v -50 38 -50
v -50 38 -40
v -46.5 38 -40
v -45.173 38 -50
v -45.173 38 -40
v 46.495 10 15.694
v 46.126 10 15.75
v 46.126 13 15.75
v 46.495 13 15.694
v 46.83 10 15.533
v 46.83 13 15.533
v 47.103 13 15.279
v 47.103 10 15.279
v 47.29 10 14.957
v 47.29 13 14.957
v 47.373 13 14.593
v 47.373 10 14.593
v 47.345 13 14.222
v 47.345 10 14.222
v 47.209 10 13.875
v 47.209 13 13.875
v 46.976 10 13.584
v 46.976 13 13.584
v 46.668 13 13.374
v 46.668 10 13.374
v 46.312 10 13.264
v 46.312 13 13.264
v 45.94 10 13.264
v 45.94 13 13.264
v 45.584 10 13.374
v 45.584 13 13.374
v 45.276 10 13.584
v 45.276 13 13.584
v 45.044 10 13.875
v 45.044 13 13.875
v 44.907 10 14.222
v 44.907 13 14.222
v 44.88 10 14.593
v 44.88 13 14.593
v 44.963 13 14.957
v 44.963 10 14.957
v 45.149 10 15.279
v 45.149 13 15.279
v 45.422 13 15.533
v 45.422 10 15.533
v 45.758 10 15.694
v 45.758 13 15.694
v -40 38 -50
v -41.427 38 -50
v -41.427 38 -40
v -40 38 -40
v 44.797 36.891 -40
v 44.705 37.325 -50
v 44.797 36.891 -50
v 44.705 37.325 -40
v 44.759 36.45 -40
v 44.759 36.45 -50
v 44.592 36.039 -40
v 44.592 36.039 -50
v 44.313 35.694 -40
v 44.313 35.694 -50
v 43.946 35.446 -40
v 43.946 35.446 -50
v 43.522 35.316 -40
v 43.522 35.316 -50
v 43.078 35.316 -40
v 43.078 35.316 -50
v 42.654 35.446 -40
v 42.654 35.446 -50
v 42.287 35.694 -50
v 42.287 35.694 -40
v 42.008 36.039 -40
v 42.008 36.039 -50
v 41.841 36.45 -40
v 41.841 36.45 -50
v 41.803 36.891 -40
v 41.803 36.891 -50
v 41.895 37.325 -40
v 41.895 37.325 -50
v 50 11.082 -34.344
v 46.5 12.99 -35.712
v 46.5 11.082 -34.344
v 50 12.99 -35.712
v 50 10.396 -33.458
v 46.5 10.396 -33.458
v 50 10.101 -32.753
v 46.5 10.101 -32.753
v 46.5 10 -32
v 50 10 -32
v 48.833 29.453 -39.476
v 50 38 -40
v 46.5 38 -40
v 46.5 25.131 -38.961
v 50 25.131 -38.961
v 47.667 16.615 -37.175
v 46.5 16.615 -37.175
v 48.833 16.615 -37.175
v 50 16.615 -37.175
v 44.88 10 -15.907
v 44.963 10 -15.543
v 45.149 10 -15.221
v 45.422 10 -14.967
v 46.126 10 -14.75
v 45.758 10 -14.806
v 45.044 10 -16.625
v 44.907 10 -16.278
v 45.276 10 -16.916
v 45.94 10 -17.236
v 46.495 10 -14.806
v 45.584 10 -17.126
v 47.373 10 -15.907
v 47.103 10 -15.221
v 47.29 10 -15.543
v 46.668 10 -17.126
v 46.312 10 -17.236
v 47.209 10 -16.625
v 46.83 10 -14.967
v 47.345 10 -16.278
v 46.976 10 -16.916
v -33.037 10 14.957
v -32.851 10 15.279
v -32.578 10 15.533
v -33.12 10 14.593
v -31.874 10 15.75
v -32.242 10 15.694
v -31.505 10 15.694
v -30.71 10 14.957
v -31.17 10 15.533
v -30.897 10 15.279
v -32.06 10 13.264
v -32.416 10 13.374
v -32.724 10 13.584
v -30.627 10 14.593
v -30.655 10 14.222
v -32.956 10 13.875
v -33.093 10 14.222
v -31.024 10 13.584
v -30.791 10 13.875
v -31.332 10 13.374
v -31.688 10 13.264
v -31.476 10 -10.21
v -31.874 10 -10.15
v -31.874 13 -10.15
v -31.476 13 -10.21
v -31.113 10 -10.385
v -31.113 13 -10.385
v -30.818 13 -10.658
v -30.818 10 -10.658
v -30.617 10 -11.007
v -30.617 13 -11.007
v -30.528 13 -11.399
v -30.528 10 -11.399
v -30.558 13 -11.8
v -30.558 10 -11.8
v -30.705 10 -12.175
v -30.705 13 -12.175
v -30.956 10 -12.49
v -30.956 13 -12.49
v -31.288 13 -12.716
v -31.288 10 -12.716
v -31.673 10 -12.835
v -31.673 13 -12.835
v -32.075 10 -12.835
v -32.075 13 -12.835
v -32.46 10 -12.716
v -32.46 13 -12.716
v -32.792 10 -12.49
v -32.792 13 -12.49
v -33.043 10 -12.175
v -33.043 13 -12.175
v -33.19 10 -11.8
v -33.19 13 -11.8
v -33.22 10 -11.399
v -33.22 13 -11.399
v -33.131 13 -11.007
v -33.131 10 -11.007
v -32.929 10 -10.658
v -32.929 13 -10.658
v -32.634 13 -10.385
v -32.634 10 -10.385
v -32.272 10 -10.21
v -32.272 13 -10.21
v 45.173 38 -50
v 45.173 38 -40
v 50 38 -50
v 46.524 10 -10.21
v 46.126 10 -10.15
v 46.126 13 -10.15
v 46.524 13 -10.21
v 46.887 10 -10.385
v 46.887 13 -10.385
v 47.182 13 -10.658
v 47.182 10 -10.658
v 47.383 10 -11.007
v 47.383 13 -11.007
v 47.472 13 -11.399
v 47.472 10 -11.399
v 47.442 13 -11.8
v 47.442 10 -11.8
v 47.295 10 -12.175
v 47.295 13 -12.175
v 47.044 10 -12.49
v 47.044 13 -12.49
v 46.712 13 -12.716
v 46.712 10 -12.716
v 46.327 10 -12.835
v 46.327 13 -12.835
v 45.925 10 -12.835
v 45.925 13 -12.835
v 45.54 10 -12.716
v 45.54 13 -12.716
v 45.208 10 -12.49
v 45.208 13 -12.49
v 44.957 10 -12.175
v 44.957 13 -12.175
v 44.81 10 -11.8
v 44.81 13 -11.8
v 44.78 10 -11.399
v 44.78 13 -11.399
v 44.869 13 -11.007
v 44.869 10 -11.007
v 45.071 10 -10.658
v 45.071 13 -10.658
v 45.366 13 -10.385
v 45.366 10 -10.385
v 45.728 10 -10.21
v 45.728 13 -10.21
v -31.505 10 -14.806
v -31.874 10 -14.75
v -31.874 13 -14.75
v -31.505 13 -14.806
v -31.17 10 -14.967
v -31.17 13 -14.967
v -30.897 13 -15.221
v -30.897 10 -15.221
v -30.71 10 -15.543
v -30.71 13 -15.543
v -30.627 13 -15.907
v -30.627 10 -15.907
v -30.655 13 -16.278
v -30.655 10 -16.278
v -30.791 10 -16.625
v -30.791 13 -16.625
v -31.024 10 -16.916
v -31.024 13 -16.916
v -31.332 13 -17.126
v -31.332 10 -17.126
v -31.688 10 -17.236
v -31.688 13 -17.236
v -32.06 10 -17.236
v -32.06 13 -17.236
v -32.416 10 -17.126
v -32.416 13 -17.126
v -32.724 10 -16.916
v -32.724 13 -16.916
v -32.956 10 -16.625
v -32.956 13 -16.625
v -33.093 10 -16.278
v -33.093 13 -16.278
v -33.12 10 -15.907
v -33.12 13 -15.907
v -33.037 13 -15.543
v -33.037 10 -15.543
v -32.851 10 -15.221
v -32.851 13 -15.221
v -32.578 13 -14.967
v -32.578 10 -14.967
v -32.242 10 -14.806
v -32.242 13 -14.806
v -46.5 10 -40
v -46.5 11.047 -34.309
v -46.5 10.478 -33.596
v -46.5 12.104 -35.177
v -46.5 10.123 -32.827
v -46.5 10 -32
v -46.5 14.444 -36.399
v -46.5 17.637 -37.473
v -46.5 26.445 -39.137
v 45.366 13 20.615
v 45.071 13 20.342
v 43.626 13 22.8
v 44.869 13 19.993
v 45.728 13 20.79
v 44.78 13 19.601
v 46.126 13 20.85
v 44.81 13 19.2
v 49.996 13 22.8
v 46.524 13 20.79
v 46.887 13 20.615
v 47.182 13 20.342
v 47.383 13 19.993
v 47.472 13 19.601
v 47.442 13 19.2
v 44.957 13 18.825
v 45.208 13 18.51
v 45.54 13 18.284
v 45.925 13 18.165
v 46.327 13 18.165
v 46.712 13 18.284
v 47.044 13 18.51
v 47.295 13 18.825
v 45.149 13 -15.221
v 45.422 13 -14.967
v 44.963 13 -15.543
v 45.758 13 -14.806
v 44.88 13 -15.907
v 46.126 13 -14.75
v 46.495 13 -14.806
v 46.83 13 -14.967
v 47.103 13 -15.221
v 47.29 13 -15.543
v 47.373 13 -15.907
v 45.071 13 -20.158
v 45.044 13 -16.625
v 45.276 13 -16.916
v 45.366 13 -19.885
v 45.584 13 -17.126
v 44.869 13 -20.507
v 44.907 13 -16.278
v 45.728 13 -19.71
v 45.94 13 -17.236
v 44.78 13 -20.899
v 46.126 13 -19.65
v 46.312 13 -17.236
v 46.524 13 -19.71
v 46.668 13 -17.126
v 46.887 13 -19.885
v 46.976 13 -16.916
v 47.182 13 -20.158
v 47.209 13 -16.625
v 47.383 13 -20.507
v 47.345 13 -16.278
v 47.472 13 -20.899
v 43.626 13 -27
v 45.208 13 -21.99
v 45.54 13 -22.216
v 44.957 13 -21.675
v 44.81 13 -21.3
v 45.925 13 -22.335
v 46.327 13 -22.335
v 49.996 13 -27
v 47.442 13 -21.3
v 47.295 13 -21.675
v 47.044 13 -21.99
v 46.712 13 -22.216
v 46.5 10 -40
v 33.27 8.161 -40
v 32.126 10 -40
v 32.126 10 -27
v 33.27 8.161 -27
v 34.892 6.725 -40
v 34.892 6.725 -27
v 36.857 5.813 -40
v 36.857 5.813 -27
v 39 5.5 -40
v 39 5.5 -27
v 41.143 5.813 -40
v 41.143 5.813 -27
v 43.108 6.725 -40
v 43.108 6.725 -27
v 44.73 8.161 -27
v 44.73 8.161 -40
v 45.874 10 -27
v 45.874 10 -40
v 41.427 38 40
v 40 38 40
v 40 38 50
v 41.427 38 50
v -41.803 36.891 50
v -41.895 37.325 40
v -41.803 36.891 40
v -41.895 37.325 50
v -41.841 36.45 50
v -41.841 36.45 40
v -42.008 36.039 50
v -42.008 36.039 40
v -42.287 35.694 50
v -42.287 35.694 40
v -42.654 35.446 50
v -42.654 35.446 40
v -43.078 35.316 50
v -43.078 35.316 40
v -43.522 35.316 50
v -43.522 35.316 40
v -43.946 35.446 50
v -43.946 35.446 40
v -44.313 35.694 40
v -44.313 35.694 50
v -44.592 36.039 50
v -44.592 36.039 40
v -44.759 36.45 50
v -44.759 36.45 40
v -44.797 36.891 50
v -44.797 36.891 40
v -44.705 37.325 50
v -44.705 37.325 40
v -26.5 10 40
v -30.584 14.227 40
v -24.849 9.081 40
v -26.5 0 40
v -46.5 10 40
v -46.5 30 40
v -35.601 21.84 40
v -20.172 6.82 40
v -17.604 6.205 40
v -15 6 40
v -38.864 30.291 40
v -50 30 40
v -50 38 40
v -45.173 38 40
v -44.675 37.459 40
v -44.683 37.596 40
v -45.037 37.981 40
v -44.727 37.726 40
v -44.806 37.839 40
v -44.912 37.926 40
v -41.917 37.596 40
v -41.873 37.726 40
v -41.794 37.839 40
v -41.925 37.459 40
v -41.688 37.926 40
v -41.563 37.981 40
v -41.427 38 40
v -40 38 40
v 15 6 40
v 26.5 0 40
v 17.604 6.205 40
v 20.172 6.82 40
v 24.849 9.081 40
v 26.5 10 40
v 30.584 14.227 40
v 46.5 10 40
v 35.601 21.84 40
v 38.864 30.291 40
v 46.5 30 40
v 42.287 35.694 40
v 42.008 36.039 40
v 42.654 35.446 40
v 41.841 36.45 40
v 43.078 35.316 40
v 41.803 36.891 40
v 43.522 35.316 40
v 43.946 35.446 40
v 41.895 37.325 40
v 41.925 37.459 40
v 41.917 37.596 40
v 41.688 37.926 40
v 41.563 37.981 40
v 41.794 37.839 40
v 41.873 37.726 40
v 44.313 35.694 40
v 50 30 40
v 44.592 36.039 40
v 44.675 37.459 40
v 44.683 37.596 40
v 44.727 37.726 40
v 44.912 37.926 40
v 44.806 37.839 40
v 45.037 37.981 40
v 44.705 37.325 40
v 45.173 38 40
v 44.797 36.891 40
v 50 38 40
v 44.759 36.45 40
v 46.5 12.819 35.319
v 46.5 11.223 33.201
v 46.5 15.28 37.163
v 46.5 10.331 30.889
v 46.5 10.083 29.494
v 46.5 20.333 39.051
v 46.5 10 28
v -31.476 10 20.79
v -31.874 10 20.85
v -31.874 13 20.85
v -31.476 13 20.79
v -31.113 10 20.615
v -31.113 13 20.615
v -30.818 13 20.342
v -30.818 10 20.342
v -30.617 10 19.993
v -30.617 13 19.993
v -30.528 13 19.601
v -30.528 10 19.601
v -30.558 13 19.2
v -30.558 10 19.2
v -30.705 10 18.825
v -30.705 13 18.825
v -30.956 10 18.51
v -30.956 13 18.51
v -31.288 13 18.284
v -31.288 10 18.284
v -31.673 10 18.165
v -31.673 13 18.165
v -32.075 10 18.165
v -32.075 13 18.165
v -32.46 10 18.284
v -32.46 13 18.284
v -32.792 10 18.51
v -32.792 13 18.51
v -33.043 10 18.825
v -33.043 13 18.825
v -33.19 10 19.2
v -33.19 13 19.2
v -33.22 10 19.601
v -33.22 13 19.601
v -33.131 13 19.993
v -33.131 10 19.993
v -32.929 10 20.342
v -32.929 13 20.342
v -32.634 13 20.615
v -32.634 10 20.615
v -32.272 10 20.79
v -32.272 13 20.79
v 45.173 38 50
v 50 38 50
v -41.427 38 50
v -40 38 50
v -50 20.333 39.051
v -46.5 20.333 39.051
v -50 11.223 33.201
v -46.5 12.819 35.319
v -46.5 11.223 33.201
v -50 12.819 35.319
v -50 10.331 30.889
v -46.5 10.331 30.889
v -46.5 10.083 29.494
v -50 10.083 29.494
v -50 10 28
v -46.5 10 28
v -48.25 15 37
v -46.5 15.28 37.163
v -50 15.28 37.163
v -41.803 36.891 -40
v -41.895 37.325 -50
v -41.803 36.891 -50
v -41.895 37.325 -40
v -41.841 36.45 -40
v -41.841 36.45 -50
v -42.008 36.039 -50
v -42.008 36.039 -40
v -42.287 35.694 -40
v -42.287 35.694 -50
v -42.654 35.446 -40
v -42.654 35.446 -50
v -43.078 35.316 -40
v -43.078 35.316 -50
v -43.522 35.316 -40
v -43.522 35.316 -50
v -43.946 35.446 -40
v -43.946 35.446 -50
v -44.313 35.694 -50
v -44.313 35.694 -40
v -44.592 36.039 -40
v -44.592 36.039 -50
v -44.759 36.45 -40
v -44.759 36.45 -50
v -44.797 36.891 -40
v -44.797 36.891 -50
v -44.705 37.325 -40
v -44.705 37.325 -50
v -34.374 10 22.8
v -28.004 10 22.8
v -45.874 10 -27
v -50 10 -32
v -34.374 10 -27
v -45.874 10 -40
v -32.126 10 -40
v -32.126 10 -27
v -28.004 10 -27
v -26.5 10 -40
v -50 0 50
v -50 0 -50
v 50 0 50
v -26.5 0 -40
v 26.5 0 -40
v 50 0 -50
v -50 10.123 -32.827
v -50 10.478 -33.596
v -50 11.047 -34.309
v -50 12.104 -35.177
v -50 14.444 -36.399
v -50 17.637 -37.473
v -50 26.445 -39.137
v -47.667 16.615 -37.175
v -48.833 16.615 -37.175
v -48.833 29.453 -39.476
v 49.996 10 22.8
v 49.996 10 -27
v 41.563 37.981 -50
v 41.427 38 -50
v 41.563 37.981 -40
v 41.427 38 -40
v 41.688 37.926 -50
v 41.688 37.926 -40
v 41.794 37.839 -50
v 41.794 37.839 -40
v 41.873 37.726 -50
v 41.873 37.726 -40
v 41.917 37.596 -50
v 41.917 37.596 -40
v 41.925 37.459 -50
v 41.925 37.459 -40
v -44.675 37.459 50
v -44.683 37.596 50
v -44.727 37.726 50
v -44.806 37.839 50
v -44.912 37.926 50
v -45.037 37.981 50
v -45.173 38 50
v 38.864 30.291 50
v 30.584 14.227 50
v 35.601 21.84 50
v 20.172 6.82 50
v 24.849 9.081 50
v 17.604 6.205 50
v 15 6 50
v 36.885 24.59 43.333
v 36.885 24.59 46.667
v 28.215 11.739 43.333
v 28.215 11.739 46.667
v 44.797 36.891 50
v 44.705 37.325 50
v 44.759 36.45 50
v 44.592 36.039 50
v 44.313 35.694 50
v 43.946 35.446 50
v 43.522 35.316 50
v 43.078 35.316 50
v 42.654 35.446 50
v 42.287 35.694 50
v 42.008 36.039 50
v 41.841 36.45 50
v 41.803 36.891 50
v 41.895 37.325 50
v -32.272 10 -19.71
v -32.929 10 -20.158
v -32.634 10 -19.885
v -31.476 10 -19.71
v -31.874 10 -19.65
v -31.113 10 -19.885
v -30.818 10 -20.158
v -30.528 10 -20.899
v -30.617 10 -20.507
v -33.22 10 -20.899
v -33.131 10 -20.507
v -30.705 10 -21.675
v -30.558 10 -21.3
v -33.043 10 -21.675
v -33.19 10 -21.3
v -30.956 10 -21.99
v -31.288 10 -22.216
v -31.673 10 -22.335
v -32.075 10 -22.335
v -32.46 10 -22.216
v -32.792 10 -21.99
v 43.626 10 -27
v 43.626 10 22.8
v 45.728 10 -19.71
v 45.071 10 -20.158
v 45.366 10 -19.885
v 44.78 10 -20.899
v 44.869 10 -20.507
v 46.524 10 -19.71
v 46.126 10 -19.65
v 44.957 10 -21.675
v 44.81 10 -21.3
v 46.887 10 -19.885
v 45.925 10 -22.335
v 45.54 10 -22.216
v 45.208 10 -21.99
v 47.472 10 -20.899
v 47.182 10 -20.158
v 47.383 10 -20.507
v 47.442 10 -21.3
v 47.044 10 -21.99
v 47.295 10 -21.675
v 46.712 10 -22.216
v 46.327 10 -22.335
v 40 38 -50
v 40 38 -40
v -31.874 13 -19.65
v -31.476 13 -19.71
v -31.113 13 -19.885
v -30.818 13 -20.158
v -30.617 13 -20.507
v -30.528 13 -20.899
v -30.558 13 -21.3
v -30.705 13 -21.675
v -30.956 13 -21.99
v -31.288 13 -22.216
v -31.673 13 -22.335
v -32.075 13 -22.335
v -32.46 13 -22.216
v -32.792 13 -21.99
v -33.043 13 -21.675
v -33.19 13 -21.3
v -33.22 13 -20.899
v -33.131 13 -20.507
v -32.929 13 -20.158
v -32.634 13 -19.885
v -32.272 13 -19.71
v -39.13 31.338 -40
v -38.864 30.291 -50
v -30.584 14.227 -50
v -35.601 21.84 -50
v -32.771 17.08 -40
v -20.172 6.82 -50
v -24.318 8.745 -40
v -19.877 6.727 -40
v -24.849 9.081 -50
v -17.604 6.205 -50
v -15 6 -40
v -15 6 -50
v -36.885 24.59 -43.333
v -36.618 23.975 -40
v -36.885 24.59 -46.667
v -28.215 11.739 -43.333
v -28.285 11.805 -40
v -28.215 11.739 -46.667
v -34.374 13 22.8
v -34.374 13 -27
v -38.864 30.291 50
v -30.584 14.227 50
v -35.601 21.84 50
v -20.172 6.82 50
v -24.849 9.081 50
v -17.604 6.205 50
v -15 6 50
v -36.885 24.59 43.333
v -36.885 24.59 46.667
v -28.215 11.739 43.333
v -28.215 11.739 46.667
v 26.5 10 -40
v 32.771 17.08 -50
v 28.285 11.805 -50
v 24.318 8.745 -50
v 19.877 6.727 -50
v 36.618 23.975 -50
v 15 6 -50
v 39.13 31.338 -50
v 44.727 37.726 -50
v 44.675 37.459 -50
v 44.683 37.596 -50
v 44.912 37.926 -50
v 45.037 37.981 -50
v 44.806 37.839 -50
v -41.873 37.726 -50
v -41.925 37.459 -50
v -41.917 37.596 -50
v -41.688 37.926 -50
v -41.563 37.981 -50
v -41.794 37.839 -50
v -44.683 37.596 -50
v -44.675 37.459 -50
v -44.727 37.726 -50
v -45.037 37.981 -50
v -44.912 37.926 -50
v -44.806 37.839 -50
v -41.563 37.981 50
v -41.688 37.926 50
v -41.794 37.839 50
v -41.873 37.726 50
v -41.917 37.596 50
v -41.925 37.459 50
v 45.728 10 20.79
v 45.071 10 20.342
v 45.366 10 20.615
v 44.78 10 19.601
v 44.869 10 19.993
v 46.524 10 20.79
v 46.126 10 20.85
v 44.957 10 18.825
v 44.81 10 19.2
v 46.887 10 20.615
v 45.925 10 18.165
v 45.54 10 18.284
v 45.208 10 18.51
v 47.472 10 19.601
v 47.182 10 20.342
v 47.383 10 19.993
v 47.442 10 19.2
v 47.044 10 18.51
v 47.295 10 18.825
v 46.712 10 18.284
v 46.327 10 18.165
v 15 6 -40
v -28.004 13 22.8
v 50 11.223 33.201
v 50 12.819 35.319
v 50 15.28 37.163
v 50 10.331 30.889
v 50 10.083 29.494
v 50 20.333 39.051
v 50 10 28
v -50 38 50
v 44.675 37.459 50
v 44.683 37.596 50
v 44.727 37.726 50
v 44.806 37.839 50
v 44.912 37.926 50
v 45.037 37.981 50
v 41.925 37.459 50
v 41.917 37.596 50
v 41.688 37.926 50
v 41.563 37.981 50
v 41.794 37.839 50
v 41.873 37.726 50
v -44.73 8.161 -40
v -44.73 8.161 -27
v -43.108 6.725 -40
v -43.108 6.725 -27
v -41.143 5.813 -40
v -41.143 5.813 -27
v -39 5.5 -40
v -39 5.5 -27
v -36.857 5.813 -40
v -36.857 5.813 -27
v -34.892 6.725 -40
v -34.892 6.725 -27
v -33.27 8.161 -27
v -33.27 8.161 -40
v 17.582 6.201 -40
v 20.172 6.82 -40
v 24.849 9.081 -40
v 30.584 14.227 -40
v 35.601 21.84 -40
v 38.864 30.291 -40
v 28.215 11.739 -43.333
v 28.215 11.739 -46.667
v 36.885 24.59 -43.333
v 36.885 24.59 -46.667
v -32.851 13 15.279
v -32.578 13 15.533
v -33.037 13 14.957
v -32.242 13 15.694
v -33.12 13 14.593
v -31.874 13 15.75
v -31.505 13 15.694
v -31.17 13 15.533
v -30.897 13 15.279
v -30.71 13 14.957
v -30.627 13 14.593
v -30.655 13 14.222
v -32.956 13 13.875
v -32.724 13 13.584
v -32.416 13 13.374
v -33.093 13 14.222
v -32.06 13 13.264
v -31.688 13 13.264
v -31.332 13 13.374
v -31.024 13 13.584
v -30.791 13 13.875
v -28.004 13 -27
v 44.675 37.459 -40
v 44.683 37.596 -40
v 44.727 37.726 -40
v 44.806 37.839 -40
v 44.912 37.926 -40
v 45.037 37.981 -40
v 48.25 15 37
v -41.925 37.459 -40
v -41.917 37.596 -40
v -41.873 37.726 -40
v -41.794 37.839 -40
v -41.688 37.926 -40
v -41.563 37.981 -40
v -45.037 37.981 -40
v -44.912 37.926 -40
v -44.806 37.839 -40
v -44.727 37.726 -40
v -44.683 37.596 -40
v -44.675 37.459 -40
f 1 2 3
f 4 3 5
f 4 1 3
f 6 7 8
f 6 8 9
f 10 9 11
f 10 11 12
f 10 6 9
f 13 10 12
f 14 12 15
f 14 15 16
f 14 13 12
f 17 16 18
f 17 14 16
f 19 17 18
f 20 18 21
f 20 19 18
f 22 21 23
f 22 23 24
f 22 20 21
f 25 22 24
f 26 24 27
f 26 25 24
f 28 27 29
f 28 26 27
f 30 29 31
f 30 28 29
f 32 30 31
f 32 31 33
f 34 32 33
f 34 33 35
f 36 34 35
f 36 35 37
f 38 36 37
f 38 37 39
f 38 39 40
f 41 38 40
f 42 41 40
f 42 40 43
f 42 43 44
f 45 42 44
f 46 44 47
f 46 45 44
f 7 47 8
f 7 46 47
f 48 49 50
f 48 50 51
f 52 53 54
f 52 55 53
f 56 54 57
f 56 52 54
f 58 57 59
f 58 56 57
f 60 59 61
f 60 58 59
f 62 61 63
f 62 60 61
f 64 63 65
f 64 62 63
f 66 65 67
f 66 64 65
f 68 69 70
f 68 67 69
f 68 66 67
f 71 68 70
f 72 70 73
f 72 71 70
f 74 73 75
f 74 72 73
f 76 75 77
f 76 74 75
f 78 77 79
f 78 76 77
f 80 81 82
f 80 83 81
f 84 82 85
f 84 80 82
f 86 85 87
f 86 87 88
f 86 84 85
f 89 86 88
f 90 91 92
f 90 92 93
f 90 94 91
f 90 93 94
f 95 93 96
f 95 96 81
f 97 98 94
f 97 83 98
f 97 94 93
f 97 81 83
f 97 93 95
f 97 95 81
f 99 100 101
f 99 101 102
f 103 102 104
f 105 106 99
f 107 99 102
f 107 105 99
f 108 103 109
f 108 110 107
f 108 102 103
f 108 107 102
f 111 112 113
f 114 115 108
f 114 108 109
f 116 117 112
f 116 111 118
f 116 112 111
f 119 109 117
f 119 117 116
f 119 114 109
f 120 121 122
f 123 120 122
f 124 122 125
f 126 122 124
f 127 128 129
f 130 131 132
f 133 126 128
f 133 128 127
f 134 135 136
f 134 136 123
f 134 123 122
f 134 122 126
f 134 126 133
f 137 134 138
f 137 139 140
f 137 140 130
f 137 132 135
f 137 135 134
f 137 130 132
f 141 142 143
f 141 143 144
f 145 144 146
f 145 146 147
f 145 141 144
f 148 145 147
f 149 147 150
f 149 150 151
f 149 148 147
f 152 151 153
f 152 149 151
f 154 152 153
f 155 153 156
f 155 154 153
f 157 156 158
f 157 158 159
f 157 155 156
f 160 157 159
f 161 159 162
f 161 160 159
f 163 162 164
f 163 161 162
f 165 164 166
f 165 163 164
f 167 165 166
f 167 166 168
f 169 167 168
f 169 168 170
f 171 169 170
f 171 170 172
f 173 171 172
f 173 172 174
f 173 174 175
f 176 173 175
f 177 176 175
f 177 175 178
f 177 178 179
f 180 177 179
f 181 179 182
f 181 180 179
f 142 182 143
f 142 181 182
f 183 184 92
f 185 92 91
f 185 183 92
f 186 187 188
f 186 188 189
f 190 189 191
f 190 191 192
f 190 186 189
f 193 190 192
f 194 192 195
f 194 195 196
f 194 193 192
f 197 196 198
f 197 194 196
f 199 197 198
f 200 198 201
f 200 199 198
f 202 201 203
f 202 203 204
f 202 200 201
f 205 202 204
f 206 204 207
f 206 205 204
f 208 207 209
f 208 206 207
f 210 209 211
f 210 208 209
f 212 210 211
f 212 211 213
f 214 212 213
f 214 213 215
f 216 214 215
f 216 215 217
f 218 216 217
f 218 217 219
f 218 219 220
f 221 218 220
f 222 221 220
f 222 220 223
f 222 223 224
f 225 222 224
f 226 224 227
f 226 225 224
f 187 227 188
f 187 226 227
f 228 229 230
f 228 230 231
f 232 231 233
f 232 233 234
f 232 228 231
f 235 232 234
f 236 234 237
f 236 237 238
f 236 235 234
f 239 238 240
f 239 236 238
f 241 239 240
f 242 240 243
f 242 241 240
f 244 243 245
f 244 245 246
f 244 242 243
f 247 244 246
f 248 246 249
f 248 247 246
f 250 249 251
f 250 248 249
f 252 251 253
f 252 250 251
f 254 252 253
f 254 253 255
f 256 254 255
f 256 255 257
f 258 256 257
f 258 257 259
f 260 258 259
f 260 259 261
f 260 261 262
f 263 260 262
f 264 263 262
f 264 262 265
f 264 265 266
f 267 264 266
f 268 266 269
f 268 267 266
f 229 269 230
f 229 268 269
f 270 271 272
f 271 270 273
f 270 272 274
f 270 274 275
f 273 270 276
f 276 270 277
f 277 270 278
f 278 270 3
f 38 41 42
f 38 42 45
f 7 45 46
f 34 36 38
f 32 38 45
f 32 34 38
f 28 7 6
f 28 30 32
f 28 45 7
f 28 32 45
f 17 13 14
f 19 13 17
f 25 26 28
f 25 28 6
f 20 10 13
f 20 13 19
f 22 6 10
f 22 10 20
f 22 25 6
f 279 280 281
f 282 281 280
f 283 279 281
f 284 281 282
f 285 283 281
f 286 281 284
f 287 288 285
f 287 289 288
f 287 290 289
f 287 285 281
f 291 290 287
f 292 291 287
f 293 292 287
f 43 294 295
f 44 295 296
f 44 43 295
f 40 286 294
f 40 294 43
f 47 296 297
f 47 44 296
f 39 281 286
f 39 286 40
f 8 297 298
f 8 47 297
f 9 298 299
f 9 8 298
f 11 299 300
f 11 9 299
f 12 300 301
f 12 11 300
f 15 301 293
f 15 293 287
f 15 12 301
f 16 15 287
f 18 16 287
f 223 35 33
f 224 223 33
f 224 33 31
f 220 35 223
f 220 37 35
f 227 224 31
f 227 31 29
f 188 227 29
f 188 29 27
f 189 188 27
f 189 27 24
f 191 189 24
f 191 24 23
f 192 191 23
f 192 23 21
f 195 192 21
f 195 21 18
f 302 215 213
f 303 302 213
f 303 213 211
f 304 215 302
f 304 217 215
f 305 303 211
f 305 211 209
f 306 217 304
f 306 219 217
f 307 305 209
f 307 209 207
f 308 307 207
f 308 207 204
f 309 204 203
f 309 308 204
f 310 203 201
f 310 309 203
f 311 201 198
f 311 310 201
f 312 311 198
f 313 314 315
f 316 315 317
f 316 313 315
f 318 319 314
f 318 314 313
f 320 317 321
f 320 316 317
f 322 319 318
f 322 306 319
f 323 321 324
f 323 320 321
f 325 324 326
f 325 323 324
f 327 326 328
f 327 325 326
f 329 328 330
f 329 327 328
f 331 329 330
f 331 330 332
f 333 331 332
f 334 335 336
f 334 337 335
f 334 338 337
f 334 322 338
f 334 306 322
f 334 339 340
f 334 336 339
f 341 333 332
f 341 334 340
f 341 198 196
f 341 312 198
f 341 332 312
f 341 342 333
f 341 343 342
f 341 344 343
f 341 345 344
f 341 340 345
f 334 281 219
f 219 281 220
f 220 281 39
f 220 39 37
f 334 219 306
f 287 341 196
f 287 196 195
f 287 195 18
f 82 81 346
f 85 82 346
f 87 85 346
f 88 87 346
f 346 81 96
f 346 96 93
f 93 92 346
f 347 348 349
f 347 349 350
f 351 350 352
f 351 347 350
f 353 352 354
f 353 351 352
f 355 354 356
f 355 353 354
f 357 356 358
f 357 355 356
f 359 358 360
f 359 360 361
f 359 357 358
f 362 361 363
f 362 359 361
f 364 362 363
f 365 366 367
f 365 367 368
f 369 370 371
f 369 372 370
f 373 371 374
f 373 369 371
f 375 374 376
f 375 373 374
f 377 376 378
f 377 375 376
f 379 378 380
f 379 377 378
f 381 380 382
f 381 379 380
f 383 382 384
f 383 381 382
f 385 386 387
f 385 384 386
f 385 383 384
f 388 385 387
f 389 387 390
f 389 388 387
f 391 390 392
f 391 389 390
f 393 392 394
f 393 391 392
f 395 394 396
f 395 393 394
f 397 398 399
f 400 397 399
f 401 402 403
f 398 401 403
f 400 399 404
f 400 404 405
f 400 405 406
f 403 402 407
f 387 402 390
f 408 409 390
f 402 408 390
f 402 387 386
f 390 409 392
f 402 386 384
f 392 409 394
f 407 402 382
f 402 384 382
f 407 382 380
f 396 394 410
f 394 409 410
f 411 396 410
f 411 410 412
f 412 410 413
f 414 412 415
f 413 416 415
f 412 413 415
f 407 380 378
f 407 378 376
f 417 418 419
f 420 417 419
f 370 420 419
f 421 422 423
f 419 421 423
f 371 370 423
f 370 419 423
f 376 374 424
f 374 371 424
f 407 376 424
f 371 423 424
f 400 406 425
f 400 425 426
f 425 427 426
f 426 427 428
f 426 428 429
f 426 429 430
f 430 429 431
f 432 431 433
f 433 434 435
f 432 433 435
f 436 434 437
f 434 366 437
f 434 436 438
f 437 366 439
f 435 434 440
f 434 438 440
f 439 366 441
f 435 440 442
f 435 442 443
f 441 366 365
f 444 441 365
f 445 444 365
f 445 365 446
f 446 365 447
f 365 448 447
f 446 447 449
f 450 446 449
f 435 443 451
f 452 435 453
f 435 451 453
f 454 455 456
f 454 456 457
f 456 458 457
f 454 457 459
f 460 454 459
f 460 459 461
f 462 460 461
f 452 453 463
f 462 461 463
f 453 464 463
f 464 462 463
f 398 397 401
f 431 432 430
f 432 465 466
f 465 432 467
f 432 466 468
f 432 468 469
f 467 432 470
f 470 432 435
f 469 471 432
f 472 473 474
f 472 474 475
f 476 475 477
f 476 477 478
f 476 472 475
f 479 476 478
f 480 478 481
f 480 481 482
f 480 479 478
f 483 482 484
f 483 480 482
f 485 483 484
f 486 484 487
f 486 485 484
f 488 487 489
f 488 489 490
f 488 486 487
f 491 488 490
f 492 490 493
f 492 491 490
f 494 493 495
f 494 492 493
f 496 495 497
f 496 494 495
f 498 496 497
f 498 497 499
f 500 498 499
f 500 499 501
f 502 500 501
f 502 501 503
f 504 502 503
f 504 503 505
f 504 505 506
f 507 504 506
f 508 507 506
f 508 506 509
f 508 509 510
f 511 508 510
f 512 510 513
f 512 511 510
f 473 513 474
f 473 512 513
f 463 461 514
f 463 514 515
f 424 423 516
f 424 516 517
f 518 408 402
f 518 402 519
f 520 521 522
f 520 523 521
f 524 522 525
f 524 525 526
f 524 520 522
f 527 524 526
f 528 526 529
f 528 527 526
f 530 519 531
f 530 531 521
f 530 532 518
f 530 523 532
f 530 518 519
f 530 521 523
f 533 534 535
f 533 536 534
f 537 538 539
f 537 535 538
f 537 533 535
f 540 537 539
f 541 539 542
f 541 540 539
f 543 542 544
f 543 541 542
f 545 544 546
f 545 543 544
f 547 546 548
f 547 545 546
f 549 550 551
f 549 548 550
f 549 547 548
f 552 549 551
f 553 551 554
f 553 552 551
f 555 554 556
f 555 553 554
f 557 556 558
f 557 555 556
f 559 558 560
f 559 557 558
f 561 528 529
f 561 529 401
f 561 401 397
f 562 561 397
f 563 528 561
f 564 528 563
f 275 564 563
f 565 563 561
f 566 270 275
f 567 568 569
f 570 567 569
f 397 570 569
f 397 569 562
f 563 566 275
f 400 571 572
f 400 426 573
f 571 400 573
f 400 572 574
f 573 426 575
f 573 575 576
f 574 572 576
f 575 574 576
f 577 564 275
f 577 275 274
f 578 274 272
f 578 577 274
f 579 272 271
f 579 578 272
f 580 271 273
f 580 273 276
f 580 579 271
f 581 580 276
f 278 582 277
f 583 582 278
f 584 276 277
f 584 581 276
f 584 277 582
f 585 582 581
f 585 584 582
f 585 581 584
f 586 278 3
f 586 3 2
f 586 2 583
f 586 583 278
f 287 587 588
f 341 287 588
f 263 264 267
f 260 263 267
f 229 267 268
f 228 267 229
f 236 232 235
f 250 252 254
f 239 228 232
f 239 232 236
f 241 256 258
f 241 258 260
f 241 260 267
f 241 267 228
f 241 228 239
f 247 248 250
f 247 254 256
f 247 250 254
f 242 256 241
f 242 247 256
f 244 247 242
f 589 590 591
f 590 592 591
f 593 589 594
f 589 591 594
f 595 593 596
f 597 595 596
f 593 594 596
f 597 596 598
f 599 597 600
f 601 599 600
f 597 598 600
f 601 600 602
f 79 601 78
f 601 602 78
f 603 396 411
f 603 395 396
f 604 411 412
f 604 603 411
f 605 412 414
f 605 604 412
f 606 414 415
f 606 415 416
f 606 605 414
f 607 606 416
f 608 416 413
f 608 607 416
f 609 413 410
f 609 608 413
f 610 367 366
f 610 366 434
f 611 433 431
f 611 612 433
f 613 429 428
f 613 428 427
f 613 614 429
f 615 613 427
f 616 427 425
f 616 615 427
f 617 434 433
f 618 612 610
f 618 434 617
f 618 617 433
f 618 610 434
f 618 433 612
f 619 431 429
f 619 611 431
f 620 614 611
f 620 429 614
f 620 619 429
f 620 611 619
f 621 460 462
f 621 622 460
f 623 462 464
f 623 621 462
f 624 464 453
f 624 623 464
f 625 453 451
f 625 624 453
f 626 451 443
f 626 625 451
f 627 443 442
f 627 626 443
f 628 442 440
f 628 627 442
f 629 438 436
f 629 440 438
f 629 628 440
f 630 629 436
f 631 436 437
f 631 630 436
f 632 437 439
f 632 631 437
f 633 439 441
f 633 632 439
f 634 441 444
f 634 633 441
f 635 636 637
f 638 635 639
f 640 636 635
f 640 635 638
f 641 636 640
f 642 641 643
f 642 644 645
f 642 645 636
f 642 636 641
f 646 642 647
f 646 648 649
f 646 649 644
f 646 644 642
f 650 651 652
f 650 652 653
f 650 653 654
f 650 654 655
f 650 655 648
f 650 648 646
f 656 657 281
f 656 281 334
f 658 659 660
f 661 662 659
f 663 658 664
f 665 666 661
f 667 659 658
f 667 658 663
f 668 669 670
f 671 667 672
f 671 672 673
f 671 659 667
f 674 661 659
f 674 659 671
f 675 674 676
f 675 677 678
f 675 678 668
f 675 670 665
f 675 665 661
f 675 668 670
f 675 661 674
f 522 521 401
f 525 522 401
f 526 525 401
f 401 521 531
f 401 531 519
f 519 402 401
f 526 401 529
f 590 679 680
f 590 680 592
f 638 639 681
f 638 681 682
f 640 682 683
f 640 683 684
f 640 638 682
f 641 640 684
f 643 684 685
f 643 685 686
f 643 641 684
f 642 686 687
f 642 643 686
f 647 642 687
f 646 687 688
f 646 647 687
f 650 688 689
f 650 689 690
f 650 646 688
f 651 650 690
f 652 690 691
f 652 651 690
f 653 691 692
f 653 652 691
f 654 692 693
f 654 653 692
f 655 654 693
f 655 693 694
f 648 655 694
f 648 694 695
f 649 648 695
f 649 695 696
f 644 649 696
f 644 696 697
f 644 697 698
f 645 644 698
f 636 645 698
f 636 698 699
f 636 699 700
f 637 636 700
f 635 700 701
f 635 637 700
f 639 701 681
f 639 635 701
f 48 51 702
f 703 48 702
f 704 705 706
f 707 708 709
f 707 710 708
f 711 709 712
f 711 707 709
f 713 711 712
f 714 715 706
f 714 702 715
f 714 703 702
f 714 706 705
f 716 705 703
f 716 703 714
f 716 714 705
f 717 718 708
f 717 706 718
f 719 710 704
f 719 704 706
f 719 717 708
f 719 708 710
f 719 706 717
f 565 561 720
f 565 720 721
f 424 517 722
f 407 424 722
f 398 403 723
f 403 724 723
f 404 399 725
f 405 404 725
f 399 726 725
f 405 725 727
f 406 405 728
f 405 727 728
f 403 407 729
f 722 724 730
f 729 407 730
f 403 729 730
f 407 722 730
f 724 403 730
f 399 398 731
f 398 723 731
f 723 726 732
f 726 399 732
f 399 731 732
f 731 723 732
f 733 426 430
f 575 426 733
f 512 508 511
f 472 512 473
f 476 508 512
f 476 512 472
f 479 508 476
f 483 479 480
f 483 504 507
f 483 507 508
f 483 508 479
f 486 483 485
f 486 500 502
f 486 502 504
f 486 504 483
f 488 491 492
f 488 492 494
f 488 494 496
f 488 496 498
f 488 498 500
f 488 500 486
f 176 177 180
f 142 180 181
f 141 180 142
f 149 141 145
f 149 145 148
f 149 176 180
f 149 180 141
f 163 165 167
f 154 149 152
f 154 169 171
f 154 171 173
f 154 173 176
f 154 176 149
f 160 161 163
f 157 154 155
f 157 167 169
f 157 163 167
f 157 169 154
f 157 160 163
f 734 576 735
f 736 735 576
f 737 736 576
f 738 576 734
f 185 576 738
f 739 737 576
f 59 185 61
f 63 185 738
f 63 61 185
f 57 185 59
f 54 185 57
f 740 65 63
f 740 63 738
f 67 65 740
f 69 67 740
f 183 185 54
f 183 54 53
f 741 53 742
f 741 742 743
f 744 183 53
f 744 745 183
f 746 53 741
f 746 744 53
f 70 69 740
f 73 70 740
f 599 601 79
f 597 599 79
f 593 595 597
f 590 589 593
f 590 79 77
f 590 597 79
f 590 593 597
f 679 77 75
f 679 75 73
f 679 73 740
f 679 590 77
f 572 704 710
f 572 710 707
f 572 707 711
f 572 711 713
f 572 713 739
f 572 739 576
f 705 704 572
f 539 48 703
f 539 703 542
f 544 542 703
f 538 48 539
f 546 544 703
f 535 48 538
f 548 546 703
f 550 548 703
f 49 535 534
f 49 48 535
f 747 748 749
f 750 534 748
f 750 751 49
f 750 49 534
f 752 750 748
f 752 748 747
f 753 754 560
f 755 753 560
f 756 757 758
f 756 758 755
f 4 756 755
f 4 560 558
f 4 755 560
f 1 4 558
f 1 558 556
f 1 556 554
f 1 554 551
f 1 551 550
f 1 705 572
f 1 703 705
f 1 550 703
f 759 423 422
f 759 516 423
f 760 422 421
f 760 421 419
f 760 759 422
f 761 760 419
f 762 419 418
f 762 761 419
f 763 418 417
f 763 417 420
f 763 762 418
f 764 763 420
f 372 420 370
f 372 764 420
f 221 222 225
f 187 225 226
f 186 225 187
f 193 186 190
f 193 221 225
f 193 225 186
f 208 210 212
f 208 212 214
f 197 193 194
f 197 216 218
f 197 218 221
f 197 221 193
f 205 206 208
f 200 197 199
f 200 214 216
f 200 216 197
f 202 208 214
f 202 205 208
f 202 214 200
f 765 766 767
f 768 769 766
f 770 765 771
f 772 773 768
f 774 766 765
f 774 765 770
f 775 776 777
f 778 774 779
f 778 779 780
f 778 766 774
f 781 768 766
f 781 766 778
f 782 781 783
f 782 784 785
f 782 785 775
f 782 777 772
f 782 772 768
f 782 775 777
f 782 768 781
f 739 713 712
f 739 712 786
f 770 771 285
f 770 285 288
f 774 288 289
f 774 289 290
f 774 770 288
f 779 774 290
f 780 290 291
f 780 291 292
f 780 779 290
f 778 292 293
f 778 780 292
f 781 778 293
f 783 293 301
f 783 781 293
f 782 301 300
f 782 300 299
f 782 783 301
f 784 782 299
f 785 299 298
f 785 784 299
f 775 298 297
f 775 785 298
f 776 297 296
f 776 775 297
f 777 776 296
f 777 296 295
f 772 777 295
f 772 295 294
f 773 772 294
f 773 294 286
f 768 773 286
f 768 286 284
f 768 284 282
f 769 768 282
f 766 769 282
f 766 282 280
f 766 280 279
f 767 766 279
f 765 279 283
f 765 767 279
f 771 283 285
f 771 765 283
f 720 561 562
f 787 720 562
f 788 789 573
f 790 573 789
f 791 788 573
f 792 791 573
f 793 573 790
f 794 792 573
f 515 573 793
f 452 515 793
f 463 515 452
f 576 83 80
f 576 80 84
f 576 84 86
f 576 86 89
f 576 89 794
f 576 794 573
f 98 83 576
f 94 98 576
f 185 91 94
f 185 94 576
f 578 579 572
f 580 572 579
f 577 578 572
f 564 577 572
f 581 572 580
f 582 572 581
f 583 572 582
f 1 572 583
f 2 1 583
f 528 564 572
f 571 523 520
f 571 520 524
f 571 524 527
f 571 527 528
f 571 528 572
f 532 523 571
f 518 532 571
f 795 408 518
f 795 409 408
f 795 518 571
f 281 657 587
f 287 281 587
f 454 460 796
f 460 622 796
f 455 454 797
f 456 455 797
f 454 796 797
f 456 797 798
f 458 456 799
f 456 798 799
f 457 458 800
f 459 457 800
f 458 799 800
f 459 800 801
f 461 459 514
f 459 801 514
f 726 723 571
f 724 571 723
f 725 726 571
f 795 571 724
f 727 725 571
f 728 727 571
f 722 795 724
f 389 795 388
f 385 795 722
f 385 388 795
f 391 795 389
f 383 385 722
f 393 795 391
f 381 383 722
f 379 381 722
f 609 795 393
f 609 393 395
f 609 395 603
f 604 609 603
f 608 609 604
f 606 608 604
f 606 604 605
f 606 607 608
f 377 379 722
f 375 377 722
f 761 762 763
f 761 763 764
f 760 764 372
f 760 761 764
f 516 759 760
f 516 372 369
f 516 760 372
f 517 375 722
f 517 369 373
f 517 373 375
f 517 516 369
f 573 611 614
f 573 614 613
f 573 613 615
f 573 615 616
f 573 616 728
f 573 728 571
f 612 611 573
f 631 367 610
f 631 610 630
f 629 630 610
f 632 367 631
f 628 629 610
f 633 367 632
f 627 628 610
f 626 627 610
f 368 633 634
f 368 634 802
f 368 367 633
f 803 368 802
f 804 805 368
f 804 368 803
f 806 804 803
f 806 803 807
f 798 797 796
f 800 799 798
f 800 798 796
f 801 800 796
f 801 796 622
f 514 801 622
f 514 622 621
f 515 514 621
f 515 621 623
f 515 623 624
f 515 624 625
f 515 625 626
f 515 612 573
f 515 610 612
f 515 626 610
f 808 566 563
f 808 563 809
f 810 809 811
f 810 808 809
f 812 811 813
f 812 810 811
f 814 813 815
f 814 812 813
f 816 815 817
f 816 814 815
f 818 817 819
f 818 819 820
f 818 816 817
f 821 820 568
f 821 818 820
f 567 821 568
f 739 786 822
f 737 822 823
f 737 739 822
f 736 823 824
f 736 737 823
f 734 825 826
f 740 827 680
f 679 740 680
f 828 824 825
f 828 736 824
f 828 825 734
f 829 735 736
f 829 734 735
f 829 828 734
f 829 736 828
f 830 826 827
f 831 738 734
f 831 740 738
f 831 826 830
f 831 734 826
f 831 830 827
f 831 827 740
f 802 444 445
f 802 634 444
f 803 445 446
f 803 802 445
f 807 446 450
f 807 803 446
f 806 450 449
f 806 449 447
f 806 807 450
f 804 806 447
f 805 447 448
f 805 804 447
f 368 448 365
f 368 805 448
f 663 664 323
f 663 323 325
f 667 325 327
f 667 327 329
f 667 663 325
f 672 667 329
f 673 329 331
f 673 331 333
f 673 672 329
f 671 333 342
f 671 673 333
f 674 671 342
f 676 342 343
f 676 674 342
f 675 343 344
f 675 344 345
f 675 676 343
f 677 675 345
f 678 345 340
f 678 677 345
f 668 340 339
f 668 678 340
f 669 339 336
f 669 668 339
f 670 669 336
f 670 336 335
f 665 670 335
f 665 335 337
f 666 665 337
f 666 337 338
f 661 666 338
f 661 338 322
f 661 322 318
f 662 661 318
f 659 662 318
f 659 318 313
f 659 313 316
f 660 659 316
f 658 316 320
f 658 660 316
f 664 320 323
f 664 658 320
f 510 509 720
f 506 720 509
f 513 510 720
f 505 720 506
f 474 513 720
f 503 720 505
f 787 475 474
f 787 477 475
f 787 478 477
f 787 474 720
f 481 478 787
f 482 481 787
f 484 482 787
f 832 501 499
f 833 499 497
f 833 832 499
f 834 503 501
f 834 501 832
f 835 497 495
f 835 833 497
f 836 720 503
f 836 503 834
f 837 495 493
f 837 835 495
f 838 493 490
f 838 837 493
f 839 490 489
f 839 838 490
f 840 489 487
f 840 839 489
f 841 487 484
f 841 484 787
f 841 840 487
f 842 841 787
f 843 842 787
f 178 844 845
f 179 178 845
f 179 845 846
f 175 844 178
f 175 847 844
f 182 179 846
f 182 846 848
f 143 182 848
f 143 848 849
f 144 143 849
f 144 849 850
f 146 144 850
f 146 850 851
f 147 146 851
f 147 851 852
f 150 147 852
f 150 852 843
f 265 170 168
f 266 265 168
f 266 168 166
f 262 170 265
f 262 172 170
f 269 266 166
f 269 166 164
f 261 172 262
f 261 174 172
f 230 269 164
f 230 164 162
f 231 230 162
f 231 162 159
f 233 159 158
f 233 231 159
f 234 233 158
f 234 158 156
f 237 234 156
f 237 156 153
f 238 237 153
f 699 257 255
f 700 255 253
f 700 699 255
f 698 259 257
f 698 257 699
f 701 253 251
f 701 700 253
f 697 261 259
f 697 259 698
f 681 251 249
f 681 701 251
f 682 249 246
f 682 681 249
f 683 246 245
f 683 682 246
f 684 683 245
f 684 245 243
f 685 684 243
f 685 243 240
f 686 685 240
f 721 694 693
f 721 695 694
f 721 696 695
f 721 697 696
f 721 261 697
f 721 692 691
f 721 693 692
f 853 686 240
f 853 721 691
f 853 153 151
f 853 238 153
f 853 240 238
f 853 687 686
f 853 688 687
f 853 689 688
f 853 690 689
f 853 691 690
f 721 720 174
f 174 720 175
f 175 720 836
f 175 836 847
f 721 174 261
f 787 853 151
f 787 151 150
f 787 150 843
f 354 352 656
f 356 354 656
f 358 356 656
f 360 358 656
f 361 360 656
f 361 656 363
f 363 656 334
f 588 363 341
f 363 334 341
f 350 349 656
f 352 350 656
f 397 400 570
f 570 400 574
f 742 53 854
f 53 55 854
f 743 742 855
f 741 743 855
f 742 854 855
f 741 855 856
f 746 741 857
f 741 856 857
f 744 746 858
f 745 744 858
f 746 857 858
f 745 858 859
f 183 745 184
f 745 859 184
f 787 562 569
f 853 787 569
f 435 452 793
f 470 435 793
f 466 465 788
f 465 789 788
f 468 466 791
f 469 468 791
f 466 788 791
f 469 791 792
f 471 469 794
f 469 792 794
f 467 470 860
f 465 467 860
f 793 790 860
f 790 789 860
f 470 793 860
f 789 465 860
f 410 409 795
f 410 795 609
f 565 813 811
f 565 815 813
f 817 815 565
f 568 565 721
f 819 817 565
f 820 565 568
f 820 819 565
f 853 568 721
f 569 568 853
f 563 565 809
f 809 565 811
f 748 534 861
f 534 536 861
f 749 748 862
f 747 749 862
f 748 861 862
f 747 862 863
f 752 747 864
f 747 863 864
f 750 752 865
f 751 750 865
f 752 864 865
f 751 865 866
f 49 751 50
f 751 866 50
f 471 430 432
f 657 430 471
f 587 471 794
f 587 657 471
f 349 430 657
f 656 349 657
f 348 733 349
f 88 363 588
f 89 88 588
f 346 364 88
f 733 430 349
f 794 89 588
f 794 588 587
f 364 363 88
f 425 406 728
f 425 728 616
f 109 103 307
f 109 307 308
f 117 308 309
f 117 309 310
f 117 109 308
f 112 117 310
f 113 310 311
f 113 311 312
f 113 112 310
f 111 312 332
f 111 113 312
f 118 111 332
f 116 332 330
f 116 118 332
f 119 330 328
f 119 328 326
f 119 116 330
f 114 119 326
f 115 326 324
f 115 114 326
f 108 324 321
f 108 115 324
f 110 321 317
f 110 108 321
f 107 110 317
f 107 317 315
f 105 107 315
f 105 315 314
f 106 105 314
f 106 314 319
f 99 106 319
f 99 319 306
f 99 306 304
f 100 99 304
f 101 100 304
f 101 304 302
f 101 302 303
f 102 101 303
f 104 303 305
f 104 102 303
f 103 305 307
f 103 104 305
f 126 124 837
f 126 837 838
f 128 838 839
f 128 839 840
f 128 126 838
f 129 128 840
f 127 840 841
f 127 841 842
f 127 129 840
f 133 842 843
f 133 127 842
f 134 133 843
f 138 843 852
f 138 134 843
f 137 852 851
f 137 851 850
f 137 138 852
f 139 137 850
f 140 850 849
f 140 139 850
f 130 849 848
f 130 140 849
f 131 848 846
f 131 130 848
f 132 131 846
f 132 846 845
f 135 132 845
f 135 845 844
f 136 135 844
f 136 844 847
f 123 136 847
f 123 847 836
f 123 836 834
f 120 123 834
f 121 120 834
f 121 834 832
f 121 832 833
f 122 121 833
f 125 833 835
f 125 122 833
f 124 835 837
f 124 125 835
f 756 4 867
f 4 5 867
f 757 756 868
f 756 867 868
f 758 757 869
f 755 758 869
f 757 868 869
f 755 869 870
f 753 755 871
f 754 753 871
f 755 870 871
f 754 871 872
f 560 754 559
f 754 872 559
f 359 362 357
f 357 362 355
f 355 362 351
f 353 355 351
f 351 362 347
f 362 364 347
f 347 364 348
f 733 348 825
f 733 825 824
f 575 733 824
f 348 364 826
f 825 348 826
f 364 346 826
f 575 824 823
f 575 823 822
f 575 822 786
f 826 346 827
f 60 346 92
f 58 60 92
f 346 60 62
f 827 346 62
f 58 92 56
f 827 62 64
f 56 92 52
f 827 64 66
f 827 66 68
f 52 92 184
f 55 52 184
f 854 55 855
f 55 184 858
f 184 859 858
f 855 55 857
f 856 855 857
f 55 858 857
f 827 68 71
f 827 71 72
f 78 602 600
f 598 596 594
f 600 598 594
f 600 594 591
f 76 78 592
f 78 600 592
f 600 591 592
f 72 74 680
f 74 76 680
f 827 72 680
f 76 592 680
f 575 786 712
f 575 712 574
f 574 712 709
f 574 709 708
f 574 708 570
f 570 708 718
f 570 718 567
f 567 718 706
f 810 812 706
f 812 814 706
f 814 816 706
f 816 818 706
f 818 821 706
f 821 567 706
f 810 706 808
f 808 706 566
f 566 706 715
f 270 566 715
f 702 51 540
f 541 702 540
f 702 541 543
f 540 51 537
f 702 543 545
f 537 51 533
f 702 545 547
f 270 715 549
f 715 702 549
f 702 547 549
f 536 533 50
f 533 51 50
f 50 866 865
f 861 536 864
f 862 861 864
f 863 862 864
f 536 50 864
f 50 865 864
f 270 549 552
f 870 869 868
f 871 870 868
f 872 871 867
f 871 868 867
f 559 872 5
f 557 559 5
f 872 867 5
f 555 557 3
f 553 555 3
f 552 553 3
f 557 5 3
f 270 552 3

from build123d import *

# Parameters (mm, degrees)
SKETCH_1_W          = 100
SKETCH_1_H          = 100
EXTRUDE_1_DEPTH     = 3
SKETCH_2_W          = 10
SKETCH_2_H          = 10
EXTRUDE_2_DEPTH     = 35
CUT_EXTRUDE_START   = -100
SKETCH_5_R          = 1.5
CUT_EXTRUDE_2_DEPTH = 100
FILLET_1_R          = 0.5
SKETCH_7_W          = 80
SKETCH_7_H          = 10
EXTRUDE_3_DEPTH     = 3
EXTRUDE_4_DEPTH     = 10
EXTRUDE_5_DEPTH     = 10
SKETCH_13_W         = 23.5
SKETCH_13_H         = 80
EXTRUDE_6_DEPTH     = 7
EXTRUDE_8_DEPTH     = 3.5
EXTRUDE_9_DEPTH     = 3.5
SKETCH_12_R         = 7.5
CUT_EXTRUDE_3_DEPTH = 13
SKETCH_14_W         = 6.37
SKETCH_14_H         = 49.8
SKETCH_14_R         = 1.35
SKETCH_14_R_2       = 1.25
EXTRUDE_7_DEPTH     = 3
SKETCH_3_W          = 53
SKETCH_3_H          = 80
CUT_EXTRUDE_1_DEPTH = 3


with BuildPart() as part:
    # 草图1 → 凸台-拉伸1 (new body)
    with BuildSketch(Plane(origin=(0, 0, 0), x_dir=(1, 0, 0), z_dir=(0, 1, 0))):
        Rectangle(SKETCH_1_W, SKETCH_1_H)
    extrude(amount=EXTRUDE_1_DEPTH)

    # 草图2 → 凸台-拉伸2 (add)
    with BuildSketch(Plane(origin=(0, 3, 0), x_dir=(1, 0, 0), z_dir=(0, 1, 0))):
        with Locations((45, 45)):
            Rectangle(SKETCH_2_W, SKETCH_2_H)
        with Locations((-45, 45)):
            Rectangle(SKETCH_2_W, SKETCH_2_H)
        with Locations((45, -45)):
            Rectangle(SKETCH_2_W, SKETCH_2_H)
        with Locations((-45, -45)):
            Rectangle(SKETCH_2_W, SKETCH_2_H)
    extrude(amount=EXTRUDE_2_DEPTH)

    # 草图5 → 切除-拉伸2 (cut)
    with BuildSketch(Plane(origin=(0, 0, -50), x_dir=(-1, 0, 0), z_dir=(0, 0, -1)).offset(CUT_EXTRUDE_START)):
        with Locations((-43.3, 36.8)):
            Circle(SKETCH_5_R)
        with Locations((43.3, 36.8)):
            Circle(SKETCH_5_R)
    extrude(amount=CUT_EXTRUDE_2_DEPTH, mode=Mode.SUBTRACT)

    # 圆角1
    fillet_1_edges = [part.edges().sort_by_distance(p)[0] for p in [
        (-44.2, 38, 45),
        (-42.4, 38, 45),
        (42.4, 38, 45),
        (44.2, 38, 45),
        (-42.4, 38, -45),
        (-44.2, 38, -45),
        (44.2, 38, -45),
        (42.4, 38, -45),
    ]]
    fillet(fillet_1_edges, radius=FILLET_1_R)

    # 草图7 → 凸台-拉伸3 (add)
    with BuildSketch(Plane(origin=(0, 3, 0), x_dir=(1, 0, 0), z_dir=(0, 1, 0))):
        with Locations((0, -45)):
            Rectangle(SKETCH_7_W, SKETCH_7_H)
        with Locations((0, 45)):
            Rectangle(SKETCH_7_W, SKETCH_7_H)
    extrude(amount=EXTRUDE_3_DEPTH)

    # 草图8 → 凸台-拉伸4 (add)
    with BuildSketch(Plane.XY.offset(50)):
        with BuildLine():
            Line((-40, 38), (-40, 6))
            Line((-40, 6), (-15, 6))
            add(Edge.make_bspline(
                [(-40, 38), (-40, 26.493596618), (-30.150326601, 6), (-15, 6)],
                knots=[0, 0, 0, 0, 1, 1, 1, 1], degree=3))
        make_face()
        with BuildLine():
            Line((40, 6), (15, 6))
            add(Edge.make_bspline(
                [(40, 38), (40, 26.493596618), (30.150326601, 6), (15, 6)],
                knots=[0, 0, 0, 0, 1, 1, 1, 1], degree=3))
            Line((40, 38), (40, 6))
        make_face()
    extrude(amount=-EXTRUDE_4_DEPTH)

    # 草图9 → 凸台-拉伸5 (add)
    with BuildSketch(Plane(origin=(0, 0, -50), x_dir=(-1, 0, 0), z_dir=(0, 0, -1))):
        with BuildLine():
            Line((-40, 6), (-15, 6))
            add(Edge.make_bspline(
                [(-15, 6), (-30.150326601, 6), (-40, 26.493596618), (-40, 38)],
                knots=[0, 0, 0, 0, 1, 1, 1, 1], degree=3))
            Line((-40, 38), (-40, 6))
        make_face()
        with BuildLine():
            Line((40, 6), (40, 38))
            add(Edge.make_bspline(
                [(40, 38), (40, 26.493596618), (30.150326601, 6), (15, 6)],
                knots=[0, 0, 0, 0, 1, 1, 1, 1], degree=3))
            Line((15, 6), (40, 6))
        make_face()
    extrude(amount=-EXTRUDE_5_DEPTH)

    # 草图13 → 凸台-拉伸6 (add)
    with BuildSketch(Plane(origin=(0, 3, 0), x_dir=(1, 0, 0), z_dir=(0, 1, 0))):
        with Locations((-38.25, 0)):
            Rectangle(SKETCH_13_W, SKETCH_13_H)
        with Locations((38.25, 0)):
            Rectangle(SKETCH_13_W, SKETCH_13_H)
    extrude(amount=EXTRUDE_6_DEPTH)

    # 草图17 → 凸台-拉伸8 (add)
    with BuildSketch(Plane(origin=(50, 0, 0), x_dir=(0, 0, -1), z_dir=(1, 0, 0))):
        with BuildLine():
            Line((32, 10), (40, 10))
            Line((40, 10), (40, 38))
            add(Edge.make_bspline(
                [(40, 38), (40, 35.102252049), (38.976100097, 10), (32, 10)],
                knots=[0, 0, 0, 0, 1, 1, 1, 1], degree=3))
        make_face()
        with BuildLine():
            Line((-40, 30), (-40, 10))
            Line((-40, 10), (-28, 10))
            add(Edge.make_bspline(
                [(-40, 30), (-40, 10), (-28, 10)],
                knots=[0, 0, 0, 1, 1, 1], degree=2))
        make_face()
    extrude(amount=-EXTRUDE_8_DEPTH)

    # 草图18 → 凸台-拉伸9 (add)
    with BuildSketch(Plane.ZY.offset(50)):
        with BuildLine():
            Line((40, 10), (40, 30))
            add(Edge.make_bspline(
                [(40, 30), (40, 10), (28, 10)],
                knots=[0, 0, 0, 1, 1, 1], degree=2))
            Line((28, 10), (40, 10))
        make_face()
        with BuildLine():
            Line((-40, 10), (-32, 10))
            add(Edge.make_bspline(
                [(-32, 10), (-38.976100097, 10), (-40, 35.102252049), (-40, 38)],
                knots=[0, 0, 0, 0, 1, 1, 1, 1], degree=3))
            Line((-40, 38), (-40, 10))
        make_face()
    extrude(amount=-EXTRUDE_9_DEPTH)

    # 草图12 → 切除-拉伸3 (cut)
    with BuildSketch(Plane.XY.offset(-40)):
        with Locations((-39, 13)):
            Circle(SKETCH_12_R)
        with Locations((39, 13)):
            Circle(SKETCH_12_R)
    extrude(amount=CUT_EXTRUDE_3_DEPTH, mode=Mode.SUBTRACT)

    # 草图14 → 凸台-拉伸7 (add)
    # profile 1 of 2: a face of its own
    with BuildSketch(Plane(origin=(0, 10, 0), x_dir=(1, 0, 0), z_dir=(0, 1, 0))):
        with Locations((-31.188863542, 2.1)):
            Rectangle(SKETCH_14_W, SKETCH_14_H)
        with Locations(Location((-31.873863542, 21, 0), (0, 0, 270))):
            Circle(SKETCH_14_R, mode=Mode.SUBTRACT)
        with Locations(Location((-31.873863542, 16, 0), (0, 0, 270))):
            Circle(SKETCH_14_R_2, mode=Mode.SUBTRACT)
        with Locations(Location((-31.873863542, 11.5, 0), (0, 0, 270))):
            Circle(SKETCH_14_R, mode=Mode.SUBTRACT)
        with Locations(Location((-31.873863542, -14.5, 0), (0, 0, 270))):
            Circle(SKETCH_14_R_2, mode=Mode.SUBTRACT)
        with Locations(Location((-31.873863542, -19.5, 0), (0, 0, 270))):
            Circle(SKETCH_14_R, mode=Mode.SUBTRACT)
    # profile 2 of 2: a face of its own
    with BuildSketch(Plane(origin=(0, 10, 0), x_dir=(1, 0, 0), z_dir=(0, 1, 0))):
        with Locations((46.811136458, 2.1)):
            Rectangle(SKETCH_14_W, SKETCH_14_H)
        with Locations(Location((46.126136458, 21, 0), (0, 0, 270))):
            Circle(SKETCH_14_R, mode=Mode.SUBTRACT)
        with Locations(Location((46.126136458, 16, 0), (0, 0, 270))):
            Circle(SKETCH_14_R_2, mode=Mode.SUBTRACT)
        with Locations(Location((46.126136458, 11.5, 0), (0, 0, 270))):
            Circle(SKETCH_14_R, mode=Mode.SUBTRACT)
        with Locations(Location((46.126136458, -14.5, 0), (0, 0, 270))):
            Circle(SKETCH_14_R_2, mode=Mode.SUBTRACT)
        with Locations(Location((46.126136458, -19.5, 0), (0, 0, 270))):
            Circle(SKETCH_14_R, mode=Mode.SUBTRACT)
    extrude(amount=EXTRUDE_7_DEPTH)

    # 草图3 → 切除-拉伸1 (cut)
    with BuildSketch(Plane(origin=(0, 3, 0), x_dir=(1, 0, 0), z_dir=(0, 1, 0))):
        Rectangle(SKETCH_3_W, SKETCH_3_H)
    extrude(amount=-CUT_EXTRUDE_1_DEPTH, mode=Mode.SUBTRACT)


solid = part.part
